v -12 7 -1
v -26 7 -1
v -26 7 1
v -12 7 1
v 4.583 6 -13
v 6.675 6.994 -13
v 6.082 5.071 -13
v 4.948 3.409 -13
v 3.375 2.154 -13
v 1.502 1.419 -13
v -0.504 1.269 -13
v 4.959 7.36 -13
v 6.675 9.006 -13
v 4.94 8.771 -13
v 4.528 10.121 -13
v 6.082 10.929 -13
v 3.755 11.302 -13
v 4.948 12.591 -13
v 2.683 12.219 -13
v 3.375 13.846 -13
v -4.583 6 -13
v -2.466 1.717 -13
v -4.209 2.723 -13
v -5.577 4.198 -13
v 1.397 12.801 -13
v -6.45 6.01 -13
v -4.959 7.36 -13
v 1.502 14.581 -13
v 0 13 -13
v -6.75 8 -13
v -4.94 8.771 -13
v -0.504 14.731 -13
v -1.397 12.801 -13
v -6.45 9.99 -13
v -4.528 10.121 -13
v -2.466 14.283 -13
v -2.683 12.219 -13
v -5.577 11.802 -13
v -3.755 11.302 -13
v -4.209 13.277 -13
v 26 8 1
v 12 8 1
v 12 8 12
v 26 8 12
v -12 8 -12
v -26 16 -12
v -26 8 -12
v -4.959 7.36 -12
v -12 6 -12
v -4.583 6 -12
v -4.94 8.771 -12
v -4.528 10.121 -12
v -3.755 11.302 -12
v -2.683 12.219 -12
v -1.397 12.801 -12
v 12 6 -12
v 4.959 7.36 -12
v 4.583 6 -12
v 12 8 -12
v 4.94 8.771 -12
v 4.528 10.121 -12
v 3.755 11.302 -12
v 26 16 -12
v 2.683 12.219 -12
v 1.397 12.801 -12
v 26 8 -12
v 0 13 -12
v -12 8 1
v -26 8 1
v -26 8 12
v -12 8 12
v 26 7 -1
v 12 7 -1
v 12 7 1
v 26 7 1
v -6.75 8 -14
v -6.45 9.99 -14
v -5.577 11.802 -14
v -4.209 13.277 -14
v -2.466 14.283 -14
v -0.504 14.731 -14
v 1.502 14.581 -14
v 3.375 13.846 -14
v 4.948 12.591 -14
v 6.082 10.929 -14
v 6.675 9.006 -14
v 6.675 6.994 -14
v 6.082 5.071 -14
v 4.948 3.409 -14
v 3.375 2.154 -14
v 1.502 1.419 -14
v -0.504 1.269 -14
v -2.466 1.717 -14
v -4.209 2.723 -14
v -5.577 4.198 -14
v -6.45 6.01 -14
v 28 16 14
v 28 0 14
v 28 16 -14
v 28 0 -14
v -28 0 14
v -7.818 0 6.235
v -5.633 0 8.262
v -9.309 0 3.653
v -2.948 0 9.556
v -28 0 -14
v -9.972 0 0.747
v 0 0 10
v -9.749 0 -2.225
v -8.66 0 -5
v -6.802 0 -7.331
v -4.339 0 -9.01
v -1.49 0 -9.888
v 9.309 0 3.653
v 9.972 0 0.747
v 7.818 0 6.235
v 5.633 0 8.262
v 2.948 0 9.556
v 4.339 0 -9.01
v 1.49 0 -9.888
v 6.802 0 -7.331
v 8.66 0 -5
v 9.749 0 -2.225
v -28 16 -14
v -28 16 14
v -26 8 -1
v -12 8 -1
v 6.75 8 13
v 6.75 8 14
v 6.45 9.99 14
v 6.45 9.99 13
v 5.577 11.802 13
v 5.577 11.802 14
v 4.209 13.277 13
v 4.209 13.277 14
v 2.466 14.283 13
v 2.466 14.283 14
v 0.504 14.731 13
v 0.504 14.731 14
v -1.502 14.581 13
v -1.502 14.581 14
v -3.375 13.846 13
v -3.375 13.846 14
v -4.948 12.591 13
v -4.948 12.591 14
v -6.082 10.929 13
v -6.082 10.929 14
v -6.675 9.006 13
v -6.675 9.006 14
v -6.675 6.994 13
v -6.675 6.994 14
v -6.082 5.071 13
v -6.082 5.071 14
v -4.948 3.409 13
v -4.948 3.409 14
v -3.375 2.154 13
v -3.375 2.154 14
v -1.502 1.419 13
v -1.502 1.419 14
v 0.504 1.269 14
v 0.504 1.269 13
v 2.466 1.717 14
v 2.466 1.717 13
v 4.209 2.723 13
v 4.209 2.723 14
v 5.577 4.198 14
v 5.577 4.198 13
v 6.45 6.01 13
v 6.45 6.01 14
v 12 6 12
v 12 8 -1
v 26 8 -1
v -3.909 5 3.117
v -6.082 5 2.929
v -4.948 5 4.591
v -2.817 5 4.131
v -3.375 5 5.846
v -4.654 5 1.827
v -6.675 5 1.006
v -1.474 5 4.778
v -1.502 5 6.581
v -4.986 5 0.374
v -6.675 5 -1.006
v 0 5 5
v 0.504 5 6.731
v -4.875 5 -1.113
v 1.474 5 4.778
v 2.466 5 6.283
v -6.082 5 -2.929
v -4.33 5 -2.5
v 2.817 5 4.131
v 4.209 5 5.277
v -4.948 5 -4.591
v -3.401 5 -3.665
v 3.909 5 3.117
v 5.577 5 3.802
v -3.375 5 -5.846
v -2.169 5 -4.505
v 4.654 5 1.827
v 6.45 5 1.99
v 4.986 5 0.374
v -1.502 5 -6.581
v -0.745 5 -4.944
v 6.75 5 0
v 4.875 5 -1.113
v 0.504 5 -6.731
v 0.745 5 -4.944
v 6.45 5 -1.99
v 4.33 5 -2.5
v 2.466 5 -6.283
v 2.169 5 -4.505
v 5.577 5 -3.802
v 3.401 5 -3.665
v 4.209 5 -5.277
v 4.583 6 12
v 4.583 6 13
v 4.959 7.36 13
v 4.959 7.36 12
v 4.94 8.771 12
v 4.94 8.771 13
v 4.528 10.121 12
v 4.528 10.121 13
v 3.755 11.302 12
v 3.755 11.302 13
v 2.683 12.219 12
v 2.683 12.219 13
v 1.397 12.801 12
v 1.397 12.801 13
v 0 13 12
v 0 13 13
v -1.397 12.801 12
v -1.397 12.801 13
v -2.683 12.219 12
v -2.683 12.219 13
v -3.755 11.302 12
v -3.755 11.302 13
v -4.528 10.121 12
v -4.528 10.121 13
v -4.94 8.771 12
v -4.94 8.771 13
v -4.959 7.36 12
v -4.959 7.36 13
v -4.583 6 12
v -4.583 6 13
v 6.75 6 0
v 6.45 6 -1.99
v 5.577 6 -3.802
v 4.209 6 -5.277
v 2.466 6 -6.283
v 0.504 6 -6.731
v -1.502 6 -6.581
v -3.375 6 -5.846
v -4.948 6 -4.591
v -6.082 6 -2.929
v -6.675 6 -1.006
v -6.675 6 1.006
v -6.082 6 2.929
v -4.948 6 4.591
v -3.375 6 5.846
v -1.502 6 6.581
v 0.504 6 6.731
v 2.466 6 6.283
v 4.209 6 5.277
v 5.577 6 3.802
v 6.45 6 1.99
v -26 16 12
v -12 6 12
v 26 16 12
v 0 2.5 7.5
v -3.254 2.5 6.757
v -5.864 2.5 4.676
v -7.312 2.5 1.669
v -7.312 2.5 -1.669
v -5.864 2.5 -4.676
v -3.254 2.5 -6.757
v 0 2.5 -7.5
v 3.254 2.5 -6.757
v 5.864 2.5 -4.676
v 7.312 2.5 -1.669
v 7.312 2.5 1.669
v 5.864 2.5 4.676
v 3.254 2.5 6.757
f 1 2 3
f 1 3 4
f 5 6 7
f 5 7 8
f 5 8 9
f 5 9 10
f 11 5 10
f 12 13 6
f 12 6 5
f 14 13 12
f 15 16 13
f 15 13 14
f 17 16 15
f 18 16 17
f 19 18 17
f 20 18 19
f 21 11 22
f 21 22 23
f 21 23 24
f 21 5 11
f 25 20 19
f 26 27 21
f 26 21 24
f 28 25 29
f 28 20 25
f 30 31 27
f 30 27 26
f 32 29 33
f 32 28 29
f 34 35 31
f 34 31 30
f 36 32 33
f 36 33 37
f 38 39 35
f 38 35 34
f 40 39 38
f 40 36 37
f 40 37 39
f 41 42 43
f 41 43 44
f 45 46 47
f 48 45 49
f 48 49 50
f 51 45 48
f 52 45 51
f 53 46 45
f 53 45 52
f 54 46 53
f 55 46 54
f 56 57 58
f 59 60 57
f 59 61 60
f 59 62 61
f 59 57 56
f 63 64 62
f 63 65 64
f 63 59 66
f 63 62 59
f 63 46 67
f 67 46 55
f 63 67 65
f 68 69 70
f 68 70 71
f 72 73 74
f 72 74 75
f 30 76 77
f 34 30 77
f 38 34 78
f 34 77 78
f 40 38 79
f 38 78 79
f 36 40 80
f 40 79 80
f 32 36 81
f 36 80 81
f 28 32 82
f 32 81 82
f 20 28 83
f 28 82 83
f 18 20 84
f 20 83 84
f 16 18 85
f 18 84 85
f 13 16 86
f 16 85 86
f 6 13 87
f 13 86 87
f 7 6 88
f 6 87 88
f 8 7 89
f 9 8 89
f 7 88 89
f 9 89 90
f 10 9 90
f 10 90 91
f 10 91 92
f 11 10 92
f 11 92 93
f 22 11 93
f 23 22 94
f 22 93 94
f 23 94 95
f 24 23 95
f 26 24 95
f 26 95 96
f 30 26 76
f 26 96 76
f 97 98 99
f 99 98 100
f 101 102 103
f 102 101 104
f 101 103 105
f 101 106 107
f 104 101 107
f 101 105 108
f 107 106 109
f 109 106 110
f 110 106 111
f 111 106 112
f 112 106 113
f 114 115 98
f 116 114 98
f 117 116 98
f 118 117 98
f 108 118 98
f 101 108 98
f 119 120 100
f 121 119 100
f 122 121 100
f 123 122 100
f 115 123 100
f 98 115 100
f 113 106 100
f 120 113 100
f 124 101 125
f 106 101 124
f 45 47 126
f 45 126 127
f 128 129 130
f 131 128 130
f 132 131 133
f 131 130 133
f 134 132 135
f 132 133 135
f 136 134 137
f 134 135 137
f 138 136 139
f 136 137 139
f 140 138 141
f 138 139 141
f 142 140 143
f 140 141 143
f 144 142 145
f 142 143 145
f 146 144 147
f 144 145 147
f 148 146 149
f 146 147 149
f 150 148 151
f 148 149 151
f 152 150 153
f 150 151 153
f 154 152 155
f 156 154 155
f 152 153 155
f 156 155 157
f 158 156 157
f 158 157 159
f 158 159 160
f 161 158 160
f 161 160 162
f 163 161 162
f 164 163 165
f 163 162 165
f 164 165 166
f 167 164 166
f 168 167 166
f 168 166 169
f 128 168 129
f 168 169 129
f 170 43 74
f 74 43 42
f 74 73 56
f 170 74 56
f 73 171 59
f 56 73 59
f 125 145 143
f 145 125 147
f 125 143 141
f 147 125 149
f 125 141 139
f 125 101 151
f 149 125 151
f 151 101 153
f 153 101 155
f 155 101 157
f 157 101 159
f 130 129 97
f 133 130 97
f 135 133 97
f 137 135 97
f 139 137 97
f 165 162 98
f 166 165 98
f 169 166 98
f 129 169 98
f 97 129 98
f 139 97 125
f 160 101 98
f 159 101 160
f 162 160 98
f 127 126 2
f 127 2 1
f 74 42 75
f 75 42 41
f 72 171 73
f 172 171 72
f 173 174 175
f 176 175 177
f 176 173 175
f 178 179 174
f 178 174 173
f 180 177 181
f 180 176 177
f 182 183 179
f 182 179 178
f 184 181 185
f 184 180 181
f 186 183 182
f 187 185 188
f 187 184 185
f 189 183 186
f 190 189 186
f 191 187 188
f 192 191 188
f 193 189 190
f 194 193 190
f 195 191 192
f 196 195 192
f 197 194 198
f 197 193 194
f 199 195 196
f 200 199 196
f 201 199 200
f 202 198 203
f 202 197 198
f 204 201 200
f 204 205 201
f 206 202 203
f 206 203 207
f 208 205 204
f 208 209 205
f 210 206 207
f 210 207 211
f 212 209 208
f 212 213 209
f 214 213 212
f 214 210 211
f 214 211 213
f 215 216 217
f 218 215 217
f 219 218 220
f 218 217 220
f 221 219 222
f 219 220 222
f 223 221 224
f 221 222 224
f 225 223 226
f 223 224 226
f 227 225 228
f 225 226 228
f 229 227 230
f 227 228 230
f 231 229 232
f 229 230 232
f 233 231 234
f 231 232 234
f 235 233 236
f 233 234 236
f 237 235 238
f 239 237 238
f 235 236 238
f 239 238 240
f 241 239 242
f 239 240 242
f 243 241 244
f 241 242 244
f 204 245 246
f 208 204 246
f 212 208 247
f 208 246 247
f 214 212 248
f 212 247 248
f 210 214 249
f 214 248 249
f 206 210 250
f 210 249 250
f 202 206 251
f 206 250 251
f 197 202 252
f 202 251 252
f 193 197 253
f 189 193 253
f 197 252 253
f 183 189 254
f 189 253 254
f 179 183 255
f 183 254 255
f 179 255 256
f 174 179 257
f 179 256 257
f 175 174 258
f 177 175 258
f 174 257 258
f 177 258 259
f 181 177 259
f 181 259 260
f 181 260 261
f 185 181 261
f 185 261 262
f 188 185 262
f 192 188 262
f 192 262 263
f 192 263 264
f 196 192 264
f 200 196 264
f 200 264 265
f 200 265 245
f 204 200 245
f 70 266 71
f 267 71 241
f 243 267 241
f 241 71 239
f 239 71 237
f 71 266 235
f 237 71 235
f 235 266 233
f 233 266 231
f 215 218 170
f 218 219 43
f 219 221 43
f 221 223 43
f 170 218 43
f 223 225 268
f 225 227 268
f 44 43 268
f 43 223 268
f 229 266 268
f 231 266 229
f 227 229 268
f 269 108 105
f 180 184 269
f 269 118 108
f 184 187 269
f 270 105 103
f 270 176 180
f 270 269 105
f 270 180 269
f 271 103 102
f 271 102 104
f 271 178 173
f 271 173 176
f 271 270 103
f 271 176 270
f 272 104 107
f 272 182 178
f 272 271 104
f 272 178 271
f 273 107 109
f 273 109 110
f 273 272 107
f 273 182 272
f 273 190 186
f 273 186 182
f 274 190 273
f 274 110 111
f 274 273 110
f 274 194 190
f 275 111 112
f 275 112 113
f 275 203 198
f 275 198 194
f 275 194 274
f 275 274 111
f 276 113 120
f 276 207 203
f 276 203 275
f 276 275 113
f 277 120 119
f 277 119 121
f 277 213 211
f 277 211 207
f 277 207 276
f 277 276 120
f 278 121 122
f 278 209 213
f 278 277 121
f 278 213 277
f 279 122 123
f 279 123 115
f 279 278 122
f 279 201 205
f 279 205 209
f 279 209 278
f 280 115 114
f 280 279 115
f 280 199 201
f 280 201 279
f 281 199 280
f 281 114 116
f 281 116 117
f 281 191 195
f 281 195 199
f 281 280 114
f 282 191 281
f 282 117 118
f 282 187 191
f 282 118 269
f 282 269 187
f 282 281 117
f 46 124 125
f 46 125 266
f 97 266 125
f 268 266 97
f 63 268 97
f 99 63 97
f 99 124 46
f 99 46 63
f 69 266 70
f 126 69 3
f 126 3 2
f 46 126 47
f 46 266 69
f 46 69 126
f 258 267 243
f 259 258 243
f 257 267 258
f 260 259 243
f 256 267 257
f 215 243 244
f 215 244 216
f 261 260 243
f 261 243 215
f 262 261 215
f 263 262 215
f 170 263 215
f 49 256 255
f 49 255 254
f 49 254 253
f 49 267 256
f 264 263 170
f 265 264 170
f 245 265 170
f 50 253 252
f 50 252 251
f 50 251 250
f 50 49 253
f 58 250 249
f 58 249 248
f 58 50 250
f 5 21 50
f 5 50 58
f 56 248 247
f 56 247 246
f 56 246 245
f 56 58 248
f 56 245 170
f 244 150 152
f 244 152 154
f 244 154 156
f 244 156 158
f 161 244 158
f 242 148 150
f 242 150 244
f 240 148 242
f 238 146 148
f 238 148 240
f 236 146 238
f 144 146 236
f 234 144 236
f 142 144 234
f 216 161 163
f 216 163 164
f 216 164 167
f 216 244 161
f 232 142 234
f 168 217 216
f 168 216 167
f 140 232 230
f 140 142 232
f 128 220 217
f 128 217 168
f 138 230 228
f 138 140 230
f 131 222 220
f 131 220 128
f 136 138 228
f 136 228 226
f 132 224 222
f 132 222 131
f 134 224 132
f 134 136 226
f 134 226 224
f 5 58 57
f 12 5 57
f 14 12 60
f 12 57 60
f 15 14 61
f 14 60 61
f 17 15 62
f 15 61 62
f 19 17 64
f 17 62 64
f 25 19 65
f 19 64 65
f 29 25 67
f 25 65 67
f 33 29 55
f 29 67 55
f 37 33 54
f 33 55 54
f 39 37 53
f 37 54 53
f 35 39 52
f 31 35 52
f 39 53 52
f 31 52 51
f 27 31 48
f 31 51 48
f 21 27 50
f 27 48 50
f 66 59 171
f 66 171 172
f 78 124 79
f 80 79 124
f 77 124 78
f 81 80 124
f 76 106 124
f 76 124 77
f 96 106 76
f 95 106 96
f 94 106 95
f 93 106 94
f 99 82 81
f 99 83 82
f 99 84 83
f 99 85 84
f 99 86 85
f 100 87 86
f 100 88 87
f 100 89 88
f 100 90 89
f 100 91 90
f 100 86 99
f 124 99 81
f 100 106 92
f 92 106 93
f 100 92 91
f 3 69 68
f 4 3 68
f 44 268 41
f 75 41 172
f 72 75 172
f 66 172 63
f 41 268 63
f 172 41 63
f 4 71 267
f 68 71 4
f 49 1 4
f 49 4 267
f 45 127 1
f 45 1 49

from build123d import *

# Parameters (mm, degrees)
SKETCH1_W           = 56
SKETCH1_H           = 28
BOSS_EXTRUDE1_DEPTH = 16
SKETCH2_W           = 52
SKETCH2_H           = 24
CUT_EXTRUDE1_DEPTH  = 8
SKETCH3_W           = 24
SKETCH3_H           = 24
CUT_EXTRUDE2_DEPTH  = 2
SKETCH4_W           = 52
SKETCH4_H           = 2
CUT_EXTRUDE3_DEPTH  = 1
SKETCH5_R           = 6.75
CUT_EXTRUDE4_DEPTH  = 1
CUT_EXTRUDE5_REACH  = 7
SKETCH6_R           = 5
SKETCH7_R           = 6.75
CUT_EXTRUDE6_DEPTH  = 1
SKETCH8_R           = 6.75
CUT_EXTRUDE7_DEPTH  = 1
CUT_EXTRUDE8_DEPTH  = 26


with BuildPart() as part:
    # Sketch1 → Boss-Extrude1 (new body)
    with BuildSketch(Plane(origin=(0, 0, 0), x_dir=(1, 0, 0), z_dir=(0, 1, 0))):
        Rectangle(SKETCH1_W, SKETCH1_H)
    extrude(amount=BOSS_EXTRUDE1_DEPTH)

    # Sketch2 → Cut-Extrude1 (cut)
    with BuildSketch(Plane(origin=(0, 16, 0), x_dir=(1, 0, 0), z_dir=(0, 1, 0))):
        Rectangle(SKETCH2_W, SKETCH2_H)
    extrude(amount=-CUT_EXTRUDE1_DEPTH, mode=Mode.SUBTRACT)

    # Sketch3 → Cut-Extrude2 (cut)
    with BuildSketch(Plane(origin=(0, 8, 0), x_dir=(1, 0, 0), z_dir=(0, 1, 0))):
        Rectangle(SKETCH3_W, SKETCH3_H)
    extrude(amount=-CUT_EXTRUDE2_DEPTH, mode=Mode.SUBTRACT)

    # Sketch4 → Cut-Extrude3 (cut)
    with BuildSketch(Plane(origin=(0, 8, 0), x_dir=(1, 0, 0), z_dir=(0, 1, 0))):
        Rectangle(SKETCH4_W, SKETCH4_H)
    extrude(amount=-CUT_EXTRUDE3_DEPTH, mode=Mode.SUBTRACT)

    # Sketch5 → Cut-Extrude4 (cut)
    with BuildSketch(Plane(origin=(0, 6, 0), x_dir=(1, 0, 0), z_dir=(0, 1, 0))):
        Circle(SKETCH5_R)
    extrude(amount=-CUT_EXTRUDE4_DEPTH, mode=Mode.SUBTRACT)

    # Sketch6 → Cut-Extrude5 (cut, up to next)
    with BuildSketch(Plane(origin=(0, 5, 0), x_dir=(1, 0, 0), z_dir=(0, 1, 0)), mode=Mode.PRIVATE) as cut_extrude5_sk1:
        Circle(SKETCH6_R)
    cut_extrude5_tool1 = extrude(cut_extrude5_sk1.sketch, amount=-CUT_EXTRUDE5_REACH, mode=Mode.PRIVATE) & part.part
    add(cut_extrude5_tool1.solids().sort_by_distance((0, 5, 0))[0], mode=Mode.SUBTRACT)

    # Sketch7 → Cut-Extrude6 (cut)
    with BuildSketch(Plane.XY.offset(14)):
        with Locations((0, 8)):
            Circle(SKETCH7_R)
    extrude(amount=-CUT_EXTRUDE6_DEPTH, mode=Mode.SUBTRACT)

    # Sketch8 → Cut-Extrude7 (cut)
    with BuildSketch(Plane(origin=(0, 0, -14), x_dir=(-1, 0, 0), z_dir=(0, 0, -1))):
        with Locations((0, 8)):
            Circle(SKETCH8_R)
    extrude(amount=-CUT_EXTRUDE7_DEPTH, mode=Mode.SUBTRACT)

    # Sketch9 → Cut-Extrude8 (cut)
    with BuildSketch(Plane.XY.offset(13)):
        with BuildLine():
            Line((-4.582575695, 6), (4.582575695, 6))
            ThreePointArc((4.582575695, 6), (0, 13), (-4.582575695, 6))
        make_face()
    extrude(amount=-CUT_EXTRUDE8_DEPTH, mode=Mode.SUBTRACT)

    # Sketch11 → Cut-Revolve2 (revolve, cut)
    with BuildSketch(Plane(origin=(0, 0, 0), x_dir=(0, 0, -1), z_dir=(1, 0, 0))):
        Polygon((0, 0), (-10, 0), (0, 10), align=None)
    revolve(axis=Axis((0, 10, 0), (0, -1, 0)), mode=Mode.SUBTRACT)


solid = part.part
